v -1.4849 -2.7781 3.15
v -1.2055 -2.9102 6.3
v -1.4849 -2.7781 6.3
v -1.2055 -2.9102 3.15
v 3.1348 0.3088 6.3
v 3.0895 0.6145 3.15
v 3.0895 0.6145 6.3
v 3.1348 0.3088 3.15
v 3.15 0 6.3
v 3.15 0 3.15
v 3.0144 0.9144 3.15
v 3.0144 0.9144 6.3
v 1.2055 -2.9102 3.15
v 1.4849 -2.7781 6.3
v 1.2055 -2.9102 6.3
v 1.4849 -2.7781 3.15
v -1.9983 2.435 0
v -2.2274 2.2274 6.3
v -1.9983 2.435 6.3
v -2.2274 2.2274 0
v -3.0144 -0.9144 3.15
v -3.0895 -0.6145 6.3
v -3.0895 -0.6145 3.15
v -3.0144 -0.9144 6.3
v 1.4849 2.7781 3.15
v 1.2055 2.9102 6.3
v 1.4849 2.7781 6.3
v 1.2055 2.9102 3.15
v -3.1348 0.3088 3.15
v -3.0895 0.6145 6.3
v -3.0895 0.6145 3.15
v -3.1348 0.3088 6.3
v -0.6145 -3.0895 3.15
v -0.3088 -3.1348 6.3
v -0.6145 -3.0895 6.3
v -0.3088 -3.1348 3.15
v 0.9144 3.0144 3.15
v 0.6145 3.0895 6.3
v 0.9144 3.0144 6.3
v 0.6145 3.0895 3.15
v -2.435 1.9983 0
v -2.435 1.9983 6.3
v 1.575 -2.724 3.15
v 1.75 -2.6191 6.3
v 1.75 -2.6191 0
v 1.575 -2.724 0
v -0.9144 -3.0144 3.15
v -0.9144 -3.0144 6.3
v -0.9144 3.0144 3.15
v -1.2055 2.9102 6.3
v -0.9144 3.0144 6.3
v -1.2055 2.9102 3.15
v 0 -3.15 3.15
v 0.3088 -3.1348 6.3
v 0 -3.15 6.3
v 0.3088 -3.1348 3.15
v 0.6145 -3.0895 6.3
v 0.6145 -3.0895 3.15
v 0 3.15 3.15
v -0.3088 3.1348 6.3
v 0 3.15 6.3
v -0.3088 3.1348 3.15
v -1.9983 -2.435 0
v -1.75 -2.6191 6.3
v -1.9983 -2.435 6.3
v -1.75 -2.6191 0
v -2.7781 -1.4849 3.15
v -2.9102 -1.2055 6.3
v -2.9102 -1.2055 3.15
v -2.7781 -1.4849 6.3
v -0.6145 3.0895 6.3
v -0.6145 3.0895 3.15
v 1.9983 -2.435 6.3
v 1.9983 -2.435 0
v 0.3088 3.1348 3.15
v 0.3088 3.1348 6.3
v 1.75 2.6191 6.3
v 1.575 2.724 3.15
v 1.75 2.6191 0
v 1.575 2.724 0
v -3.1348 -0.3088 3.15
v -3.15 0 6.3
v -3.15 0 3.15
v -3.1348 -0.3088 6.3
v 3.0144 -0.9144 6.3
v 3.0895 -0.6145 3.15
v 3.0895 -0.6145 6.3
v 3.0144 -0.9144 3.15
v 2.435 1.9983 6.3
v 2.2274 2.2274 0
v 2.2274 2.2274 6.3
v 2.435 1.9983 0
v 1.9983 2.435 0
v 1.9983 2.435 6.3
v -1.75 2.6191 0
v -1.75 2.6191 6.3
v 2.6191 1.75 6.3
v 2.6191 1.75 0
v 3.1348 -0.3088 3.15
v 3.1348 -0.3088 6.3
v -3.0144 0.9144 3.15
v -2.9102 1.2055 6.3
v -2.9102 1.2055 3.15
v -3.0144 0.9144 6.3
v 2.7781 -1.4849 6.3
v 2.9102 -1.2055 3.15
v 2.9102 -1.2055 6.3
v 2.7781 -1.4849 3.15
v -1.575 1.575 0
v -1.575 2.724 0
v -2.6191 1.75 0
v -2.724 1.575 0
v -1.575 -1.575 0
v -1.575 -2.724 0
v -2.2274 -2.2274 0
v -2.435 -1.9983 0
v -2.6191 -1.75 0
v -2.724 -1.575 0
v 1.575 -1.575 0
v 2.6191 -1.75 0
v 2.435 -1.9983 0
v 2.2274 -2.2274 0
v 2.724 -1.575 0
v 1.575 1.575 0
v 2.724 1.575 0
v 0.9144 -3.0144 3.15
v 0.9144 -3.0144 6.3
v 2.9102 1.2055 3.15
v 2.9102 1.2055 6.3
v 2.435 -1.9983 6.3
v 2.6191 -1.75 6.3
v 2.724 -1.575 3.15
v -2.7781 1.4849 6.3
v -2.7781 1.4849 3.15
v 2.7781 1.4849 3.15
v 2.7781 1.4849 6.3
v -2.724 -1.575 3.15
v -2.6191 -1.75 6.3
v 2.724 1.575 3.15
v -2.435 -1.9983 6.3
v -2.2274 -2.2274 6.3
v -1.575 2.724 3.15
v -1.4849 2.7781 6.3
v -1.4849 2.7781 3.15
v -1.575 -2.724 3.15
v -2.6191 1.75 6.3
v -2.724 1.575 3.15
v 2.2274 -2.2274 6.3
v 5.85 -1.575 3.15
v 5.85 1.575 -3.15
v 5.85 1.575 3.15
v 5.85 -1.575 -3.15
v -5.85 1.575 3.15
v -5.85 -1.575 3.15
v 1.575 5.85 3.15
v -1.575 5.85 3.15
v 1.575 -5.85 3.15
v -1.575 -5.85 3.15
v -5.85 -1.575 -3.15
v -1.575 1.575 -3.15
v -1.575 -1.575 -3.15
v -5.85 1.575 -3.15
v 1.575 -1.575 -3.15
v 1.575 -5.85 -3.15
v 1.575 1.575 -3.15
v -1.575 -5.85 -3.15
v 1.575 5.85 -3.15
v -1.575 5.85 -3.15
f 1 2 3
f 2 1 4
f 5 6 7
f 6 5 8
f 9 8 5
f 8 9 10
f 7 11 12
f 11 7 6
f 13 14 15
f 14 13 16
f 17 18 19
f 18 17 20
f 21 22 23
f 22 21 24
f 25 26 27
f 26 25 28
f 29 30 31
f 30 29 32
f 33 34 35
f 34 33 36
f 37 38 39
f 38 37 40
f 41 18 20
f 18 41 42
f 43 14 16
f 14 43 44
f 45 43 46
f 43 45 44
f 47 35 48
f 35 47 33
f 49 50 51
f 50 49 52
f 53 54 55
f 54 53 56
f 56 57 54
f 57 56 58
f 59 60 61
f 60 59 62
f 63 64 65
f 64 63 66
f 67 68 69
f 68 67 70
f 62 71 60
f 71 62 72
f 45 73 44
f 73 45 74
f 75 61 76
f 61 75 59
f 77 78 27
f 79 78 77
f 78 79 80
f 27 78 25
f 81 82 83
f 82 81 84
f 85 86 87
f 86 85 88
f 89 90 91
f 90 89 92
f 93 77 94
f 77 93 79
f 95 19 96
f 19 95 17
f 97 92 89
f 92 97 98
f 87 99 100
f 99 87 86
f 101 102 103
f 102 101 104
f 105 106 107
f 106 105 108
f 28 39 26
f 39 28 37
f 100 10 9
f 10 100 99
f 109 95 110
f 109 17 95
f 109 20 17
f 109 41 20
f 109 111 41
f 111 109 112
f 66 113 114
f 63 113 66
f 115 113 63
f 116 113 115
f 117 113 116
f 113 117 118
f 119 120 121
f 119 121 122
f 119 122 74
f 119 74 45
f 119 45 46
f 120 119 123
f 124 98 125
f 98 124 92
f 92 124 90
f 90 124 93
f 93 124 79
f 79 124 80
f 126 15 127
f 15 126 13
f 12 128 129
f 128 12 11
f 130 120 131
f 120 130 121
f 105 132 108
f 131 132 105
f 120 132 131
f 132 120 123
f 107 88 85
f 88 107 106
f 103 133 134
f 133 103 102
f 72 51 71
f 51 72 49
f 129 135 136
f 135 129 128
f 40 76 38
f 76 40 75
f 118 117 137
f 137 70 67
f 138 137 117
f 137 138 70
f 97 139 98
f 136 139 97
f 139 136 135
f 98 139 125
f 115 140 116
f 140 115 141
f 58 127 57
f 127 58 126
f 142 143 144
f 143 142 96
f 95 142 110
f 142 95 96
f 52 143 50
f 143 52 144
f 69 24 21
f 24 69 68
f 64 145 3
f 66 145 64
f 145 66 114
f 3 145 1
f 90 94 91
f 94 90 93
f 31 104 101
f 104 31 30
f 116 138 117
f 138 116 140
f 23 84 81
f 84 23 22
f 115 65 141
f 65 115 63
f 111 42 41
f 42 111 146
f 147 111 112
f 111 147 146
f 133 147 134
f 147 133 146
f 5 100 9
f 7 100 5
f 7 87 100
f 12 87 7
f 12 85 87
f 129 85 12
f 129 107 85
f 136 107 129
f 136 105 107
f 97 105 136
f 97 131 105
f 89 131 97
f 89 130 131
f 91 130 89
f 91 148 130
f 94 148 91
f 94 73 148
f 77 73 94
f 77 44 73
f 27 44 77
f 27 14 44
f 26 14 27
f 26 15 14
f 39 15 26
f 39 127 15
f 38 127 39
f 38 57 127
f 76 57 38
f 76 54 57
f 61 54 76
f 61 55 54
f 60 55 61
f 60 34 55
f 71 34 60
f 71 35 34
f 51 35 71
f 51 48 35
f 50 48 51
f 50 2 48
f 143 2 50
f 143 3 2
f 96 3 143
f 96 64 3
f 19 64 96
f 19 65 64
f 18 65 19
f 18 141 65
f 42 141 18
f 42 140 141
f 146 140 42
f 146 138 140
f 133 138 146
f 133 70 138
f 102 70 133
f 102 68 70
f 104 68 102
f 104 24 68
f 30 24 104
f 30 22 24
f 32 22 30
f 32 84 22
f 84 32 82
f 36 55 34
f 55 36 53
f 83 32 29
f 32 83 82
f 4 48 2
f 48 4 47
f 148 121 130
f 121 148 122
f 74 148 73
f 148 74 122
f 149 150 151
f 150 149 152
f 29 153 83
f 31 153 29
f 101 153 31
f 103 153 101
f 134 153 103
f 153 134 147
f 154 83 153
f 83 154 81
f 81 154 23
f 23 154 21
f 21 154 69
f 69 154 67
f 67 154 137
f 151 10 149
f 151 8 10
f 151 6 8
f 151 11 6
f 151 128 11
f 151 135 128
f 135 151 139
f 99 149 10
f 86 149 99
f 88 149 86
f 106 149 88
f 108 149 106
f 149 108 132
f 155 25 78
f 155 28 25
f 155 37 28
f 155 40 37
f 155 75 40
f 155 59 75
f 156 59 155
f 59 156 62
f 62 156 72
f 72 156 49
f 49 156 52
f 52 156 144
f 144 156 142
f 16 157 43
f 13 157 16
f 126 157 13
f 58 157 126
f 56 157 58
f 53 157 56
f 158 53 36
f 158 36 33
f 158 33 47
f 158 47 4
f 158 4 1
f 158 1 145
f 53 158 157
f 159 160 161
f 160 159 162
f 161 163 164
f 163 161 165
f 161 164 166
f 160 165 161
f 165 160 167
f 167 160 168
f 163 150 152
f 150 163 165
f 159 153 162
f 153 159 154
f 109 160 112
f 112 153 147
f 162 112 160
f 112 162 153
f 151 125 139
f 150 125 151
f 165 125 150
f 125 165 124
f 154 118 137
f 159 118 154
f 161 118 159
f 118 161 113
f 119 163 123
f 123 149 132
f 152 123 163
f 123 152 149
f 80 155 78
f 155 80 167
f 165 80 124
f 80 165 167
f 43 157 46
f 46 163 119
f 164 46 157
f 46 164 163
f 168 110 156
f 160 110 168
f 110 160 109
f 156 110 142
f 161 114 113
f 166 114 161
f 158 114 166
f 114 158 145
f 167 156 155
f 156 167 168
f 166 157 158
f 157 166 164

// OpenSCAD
module cross_hub() {
    // Central cylinder
    cylinder(h=6.3, d=6.3, $fn=64);
    
    // Rectangular prismatic lugs
    translate([-5.85, -1.575, -3.15])
        cube([11.7, 3.15, 6.3]);
    translate([-1.575, -5.85, -3.15])
        cube([3.15, 11.7, 6.3]);
}

cross_hub();
